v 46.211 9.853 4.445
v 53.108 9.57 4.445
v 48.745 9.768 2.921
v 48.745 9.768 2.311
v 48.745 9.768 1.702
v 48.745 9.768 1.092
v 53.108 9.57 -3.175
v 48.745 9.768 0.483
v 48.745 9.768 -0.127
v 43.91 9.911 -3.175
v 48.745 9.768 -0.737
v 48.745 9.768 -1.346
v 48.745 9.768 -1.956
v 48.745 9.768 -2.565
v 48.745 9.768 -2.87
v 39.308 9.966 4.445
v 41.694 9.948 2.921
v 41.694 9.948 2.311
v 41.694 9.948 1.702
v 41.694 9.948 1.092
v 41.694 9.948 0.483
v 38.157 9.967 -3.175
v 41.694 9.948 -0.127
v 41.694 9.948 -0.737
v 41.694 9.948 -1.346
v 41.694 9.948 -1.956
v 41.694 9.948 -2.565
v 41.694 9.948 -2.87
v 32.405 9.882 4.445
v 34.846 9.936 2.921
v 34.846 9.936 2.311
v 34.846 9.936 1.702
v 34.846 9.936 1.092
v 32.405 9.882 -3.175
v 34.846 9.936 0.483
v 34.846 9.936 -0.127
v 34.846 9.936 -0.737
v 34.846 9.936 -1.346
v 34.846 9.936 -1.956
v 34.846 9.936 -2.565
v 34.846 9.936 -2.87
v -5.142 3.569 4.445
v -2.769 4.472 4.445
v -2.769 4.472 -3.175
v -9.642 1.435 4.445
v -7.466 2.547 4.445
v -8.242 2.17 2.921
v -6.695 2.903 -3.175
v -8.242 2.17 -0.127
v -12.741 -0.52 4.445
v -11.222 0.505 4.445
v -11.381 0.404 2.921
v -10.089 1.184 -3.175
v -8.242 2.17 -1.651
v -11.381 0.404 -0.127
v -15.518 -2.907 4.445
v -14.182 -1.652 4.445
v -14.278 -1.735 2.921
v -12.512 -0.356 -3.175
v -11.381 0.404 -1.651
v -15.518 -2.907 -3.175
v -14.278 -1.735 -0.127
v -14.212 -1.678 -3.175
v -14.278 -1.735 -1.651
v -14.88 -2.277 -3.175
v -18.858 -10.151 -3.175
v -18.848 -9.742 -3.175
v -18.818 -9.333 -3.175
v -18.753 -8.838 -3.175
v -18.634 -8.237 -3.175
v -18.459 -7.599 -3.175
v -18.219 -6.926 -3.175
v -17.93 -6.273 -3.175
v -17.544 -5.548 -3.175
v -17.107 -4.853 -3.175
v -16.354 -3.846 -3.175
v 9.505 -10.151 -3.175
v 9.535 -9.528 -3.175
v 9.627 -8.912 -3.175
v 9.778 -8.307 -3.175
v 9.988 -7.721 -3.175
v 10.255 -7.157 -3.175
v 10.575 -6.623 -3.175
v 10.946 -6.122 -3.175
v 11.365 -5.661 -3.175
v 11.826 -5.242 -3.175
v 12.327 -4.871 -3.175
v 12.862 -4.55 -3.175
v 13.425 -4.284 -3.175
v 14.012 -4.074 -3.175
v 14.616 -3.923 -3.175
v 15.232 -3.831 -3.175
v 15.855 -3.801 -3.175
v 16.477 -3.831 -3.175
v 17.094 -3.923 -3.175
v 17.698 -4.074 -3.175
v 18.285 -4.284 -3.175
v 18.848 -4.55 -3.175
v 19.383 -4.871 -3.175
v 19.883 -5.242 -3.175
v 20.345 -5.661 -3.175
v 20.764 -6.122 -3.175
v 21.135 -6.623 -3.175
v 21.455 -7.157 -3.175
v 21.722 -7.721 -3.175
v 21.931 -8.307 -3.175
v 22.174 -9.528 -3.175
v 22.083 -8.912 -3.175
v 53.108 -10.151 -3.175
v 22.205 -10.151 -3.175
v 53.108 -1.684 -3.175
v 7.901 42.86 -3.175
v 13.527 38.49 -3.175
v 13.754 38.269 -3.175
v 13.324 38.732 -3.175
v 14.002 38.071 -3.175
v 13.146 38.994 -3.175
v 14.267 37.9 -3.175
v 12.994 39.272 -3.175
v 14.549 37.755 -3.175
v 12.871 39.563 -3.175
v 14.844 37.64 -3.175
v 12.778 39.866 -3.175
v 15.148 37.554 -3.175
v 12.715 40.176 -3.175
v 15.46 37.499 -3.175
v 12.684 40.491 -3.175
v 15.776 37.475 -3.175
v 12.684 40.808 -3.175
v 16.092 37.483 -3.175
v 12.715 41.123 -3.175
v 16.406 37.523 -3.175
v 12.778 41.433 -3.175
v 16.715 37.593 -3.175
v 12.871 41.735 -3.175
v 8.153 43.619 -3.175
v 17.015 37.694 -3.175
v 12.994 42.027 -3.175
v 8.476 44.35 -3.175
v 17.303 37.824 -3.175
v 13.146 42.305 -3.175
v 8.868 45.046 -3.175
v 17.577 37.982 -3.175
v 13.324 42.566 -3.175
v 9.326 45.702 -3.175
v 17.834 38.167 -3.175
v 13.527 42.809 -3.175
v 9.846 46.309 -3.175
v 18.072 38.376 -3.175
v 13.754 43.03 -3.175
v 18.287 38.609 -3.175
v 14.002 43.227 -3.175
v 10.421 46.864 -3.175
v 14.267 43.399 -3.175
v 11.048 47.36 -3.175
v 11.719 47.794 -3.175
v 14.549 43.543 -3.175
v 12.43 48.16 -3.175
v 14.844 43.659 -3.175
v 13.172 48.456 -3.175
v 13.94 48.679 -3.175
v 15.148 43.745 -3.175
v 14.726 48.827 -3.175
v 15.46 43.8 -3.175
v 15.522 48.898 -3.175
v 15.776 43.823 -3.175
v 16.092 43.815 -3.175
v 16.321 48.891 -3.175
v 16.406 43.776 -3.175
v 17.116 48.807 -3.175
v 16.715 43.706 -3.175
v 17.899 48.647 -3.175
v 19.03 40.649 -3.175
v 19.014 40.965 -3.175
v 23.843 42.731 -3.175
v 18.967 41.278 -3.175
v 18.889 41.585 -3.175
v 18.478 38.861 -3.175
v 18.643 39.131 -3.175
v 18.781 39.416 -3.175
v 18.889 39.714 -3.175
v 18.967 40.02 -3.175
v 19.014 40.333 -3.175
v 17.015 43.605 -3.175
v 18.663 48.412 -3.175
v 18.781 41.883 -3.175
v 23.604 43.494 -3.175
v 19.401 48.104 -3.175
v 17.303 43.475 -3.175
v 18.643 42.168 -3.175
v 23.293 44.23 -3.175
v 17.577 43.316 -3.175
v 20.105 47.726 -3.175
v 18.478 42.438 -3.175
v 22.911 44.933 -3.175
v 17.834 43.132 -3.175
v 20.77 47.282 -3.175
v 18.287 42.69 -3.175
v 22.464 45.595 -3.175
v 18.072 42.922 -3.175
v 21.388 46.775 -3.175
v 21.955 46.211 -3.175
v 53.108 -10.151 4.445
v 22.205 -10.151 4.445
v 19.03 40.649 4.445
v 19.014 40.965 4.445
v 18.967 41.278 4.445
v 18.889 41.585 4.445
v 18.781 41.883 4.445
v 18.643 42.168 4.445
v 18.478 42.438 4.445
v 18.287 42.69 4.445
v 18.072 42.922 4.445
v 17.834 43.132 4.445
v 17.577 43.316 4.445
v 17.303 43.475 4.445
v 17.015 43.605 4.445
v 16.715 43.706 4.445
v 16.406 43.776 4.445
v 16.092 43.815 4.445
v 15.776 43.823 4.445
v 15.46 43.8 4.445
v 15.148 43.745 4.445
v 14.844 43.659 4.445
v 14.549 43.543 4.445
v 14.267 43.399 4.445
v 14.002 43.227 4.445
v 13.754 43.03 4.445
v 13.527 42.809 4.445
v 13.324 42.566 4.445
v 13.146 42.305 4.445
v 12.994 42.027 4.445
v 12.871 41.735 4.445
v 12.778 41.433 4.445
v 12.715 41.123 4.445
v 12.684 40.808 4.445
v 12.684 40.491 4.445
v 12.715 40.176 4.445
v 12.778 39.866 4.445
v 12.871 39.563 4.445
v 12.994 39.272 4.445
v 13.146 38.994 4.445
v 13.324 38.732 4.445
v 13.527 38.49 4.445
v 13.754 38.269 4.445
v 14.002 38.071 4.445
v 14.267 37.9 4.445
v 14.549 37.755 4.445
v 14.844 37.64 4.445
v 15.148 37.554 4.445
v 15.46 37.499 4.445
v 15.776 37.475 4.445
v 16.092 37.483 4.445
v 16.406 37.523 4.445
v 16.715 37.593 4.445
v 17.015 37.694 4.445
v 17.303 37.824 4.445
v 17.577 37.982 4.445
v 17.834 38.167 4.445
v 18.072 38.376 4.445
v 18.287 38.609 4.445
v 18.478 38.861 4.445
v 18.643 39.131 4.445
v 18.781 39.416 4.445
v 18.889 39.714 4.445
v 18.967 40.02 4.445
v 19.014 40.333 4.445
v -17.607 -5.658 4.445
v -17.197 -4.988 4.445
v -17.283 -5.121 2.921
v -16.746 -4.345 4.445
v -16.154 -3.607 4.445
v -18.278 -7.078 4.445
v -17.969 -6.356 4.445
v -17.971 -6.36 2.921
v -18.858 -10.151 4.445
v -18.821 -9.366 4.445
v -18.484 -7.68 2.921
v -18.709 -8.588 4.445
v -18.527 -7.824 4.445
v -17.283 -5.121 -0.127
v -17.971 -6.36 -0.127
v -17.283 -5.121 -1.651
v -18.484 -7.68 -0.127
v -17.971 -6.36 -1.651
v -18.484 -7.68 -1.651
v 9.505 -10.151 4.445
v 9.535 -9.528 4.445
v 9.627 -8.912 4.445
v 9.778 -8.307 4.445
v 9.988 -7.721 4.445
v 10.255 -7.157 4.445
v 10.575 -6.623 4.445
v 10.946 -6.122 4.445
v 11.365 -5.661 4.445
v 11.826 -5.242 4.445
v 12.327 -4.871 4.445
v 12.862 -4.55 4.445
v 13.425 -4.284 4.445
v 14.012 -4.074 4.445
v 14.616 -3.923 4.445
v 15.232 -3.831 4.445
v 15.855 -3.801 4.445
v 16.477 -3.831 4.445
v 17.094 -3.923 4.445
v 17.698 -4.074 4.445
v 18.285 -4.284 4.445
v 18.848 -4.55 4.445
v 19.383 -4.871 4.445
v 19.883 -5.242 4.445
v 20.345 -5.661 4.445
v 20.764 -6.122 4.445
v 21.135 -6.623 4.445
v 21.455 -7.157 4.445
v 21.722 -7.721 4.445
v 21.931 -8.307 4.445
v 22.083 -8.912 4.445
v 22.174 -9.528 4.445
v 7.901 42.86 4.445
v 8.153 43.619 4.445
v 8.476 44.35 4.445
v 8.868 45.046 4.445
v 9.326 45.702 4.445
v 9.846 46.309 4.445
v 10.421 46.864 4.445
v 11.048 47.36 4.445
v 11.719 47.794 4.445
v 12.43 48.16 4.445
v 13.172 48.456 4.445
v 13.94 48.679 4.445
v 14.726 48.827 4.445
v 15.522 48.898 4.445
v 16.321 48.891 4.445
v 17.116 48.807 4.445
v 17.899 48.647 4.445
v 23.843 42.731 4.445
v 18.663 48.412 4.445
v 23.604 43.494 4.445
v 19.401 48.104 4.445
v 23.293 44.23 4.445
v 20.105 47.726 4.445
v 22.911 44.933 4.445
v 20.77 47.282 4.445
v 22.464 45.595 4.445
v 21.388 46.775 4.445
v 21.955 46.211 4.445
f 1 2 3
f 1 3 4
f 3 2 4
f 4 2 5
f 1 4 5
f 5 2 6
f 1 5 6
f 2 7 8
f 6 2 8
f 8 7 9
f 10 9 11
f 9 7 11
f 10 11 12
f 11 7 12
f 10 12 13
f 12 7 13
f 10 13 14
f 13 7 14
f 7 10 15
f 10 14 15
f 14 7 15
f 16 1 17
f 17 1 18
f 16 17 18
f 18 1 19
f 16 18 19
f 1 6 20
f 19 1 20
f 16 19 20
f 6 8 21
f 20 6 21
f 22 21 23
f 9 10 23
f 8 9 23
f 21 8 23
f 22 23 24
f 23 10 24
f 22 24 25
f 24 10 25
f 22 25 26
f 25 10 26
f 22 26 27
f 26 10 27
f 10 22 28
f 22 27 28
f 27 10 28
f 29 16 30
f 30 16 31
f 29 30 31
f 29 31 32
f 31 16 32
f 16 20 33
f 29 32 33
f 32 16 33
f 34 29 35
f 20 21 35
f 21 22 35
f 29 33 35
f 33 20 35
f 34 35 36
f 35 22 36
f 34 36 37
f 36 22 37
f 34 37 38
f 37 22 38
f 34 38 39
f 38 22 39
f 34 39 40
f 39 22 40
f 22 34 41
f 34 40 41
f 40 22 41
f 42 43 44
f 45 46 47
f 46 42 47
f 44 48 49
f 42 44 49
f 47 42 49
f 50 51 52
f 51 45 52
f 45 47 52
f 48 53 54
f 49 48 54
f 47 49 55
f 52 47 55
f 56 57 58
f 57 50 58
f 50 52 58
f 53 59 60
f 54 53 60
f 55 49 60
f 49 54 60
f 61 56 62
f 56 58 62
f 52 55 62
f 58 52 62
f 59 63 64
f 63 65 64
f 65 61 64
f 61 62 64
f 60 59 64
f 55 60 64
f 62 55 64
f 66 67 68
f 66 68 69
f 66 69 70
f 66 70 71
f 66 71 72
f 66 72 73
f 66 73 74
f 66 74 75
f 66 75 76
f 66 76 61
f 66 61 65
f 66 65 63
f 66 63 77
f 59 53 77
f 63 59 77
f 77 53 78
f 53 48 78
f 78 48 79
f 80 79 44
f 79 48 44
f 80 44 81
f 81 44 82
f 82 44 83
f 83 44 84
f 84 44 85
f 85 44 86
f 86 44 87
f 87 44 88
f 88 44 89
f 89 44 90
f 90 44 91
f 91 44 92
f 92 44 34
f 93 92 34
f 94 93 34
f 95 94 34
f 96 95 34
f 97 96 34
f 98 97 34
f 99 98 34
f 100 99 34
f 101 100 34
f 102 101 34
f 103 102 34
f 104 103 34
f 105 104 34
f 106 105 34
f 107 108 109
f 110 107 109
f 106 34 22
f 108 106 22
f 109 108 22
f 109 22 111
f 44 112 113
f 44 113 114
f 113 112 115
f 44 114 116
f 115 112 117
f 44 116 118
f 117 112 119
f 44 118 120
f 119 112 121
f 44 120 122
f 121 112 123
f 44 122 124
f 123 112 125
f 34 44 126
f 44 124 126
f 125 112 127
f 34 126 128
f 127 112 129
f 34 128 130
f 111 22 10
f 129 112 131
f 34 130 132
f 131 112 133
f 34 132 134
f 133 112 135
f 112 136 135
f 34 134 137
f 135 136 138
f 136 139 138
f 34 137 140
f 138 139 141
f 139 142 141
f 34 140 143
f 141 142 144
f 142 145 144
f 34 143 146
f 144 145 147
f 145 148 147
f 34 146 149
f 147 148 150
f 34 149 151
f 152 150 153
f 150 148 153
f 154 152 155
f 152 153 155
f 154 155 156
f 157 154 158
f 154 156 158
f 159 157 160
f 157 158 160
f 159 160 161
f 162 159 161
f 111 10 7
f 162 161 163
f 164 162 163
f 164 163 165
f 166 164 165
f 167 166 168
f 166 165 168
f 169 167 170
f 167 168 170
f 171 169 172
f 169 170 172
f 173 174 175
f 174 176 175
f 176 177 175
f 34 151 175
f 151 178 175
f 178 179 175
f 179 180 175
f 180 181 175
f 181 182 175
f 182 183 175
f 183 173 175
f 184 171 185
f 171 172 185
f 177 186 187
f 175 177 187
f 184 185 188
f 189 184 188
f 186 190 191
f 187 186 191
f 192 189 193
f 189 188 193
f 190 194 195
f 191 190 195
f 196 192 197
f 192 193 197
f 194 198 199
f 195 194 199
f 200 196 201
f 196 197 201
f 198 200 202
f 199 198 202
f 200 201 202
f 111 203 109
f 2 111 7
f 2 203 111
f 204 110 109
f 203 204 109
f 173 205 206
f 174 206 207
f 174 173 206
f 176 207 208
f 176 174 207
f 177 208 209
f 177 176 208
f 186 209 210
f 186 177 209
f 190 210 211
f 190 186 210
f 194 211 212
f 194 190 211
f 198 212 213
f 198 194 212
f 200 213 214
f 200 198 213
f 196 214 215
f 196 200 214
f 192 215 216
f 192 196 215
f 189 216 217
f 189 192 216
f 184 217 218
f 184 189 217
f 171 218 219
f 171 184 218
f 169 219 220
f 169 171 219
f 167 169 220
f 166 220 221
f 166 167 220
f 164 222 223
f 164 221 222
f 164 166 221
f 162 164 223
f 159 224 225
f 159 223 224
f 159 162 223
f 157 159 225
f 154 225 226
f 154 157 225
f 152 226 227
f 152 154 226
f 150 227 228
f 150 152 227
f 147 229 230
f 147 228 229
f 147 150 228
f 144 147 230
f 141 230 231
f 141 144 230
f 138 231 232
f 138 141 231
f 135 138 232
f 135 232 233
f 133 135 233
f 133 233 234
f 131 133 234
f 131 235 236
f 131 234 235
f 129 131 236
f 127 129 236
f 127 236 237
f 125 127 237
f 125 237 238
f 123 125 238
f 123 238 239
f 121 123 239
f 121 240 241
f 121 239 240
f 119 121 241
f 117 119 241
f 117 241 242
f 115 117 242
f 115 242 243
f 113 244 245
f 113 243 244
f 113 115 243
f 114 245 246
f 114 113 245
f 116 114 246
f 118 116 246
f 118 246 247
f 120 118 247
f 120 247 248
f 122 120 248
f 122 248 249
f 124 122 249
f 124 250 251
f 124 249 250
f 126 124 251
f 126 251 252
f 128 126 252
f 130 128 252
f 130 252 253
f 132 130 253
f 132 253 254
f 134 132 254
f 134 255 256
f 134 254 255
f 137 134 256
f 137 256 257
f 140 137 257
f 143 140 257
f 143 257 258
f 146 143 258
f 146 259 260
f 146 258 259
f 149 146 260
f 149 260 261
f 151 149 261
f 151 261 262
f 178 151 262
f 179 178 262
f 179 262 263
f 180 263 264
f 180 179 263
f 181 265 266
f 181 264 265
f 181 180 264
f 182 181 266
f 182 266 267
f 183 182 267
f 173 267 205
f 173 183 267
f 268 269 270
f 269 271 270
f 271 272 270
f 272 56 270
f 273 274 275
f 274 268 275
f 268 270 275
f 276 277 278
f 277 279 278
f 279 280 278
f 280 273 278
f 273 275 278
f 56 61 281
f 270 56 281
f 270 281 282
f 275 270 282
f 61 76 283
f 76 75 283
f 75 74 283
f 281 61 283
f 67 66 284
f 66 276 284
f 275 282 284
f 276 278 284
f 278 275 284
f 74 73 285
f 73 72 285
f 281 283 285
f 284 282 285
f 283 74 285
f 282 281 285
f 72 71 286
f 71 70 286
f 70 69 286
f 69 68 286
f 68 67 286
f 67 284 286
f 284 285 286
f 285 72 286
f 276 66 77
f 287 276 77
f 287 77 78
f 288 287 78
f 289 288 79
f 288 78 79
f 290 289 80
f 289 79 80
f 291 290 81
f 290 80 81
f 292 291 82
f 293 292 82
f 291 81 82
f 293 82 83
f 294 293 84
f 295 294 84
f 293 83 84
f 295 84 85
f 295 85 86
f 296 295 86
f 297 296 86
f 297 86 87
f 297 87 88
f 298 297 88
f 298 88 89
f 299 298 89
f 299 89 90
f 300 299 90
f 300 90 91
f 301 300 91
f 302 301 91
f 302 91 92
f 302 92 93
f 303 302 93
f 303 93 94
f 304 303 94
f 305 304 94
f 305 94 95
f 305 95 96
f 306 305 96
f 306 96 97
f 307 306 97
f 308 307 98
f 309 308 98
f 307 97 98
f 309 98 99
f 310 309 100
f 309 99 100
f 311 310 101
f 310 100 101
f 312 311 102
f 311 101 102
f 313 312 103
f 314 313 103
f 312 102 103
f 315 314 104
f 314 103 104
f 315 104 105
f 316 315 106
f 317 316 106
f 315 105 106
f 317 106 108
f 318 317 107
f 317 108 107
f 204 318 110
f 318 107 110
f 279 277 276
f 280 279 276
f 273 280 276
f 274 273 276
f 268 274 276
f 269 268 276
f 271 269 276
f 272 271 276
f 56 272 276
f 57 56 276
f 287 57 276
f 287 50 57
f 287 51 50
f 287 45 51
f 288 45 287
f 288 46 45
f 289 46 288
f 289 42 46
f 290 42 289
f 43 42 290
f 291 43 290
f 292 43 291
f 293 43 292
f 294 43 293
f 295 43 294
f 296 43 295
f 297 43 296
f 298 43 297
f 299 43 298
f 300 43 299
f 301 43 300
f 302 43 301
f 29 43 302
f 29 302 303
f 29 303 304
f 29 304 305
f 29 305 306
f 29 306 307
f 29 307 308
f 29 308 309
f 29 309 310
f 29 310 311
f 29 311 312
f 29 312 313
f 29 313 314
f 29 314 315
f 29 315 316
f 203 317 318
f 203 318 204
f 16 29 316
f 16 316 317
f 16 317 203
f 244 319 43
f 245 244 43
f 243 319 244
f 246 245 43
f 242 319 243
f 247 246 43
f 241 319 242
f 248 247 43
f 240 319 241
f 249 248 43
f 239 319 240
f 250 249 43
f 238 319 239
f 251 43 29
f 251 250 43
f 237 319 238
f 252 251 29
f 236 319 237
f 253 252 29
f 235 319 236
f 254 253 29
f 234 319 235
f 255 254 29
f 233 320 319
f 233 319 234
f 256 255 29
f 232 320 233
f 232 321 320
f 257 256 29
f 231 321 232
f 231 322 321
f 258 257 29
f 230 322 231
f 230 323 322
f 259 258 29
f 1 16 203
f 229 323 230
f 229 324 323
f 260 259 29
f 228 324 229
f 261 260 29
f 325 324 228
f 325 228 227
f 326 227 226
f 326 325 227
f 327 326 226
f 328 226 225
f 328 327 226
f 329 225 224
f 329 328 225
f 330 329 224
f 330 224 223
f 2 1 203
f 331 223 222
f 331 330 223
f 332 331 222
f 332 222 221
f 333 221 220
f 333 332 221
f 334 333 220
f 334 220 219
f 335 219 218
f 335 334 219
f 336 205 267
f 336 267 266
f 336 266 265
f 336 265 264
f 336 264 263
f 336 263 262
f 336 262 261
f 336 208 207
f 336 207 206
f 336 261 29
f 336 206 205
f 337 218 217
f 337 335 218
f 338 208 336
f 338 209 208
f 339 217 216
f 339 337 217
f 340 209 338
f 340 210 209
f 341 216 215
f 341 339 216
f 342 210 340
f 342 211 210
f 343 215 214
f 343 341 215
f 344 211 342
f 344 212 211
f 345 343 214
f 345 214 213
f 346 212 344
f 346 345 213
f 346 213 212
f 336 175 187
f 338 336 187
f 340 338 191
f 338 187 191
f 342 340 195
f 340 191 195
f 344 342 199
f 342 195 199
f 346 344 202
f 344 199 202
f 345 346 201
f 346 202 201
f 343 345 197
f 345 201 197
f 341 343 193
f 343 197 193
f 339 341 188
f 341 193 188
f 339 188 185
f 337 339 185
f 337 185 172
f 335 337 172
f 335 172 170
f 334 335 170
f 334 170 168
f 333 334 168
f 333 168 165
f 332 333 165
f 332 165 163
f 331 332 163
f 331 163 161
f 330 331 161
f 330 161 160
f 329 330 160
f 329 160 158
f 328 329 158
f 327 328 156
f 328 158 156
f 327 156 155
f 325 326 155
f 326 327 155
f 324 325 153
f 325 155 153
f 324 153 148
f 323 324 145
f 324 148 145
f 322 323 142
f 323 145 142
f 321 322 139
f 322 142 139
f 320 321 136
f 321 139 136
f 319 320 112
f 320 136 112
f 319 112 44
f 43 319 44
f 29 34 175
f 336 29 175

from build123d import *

# Parameters (mm, degrees)
SKETCH2_R           = 1.5875
BOSS_EXTRUDE1_DEPTH = 6.35
SKETCH3_W           = 86.520299057
SKETCH3_H           = 50.752816227
CUT_EXTRUDE1_DEPTH  = 22.86
SCALE1_SCALE        = 2
SKETCH4_W           = 272.729370393
SKETCH4_H           = 354.83187758
CUT_EXTRUDE2_DEPTH  = 5.08


with BuildPart() as part:
    # Sketch2 → Boss-Extrude1 (new body)
    # profile 1 of 3: a face of its own
    with BuildSketch(Plane.XY):
        with BuildLine():
            ThreePointArc((1.670610722, 3.717638474), (6.757246034, 4.420597856), (9.525541119, 0.095721787))
            Line((9.525541119, 0.095721787), (14.182207787, 0.095721787))
            ThreePointArc((14.182207787, 0.095721787), (17.357207787, 3.270721787), (20.532207787, 0.095721787))
            Line((20.532207787, 0.095721787), (35.983874452, 0.095721787))
            Line((35.983874452, 0.095721787), (35.983874452, 4.329055121))
            Line((35.983874452, 4.329055121), (40.217207786, 4.329055121))
            Line((40.217207786, 4.329055121), (40.217207786, 0.095721787))
            Line((40.217207786, 0.095721787), (61.383874452, 0.095721787))
            Line((61.383874452, 0.095721787), (61.383874452, 3.270721787))
            Line((61.383874452, 3.270721787), (65.617207786, 3.270721787))
            Line((65.617207786, 3.270721787), (65.617207786, 0.095721787))
            Line((65.617207786, 0.095721787), (103.86369276, 0.095721787))
            ThreePointArc((103.86369276, 0.095721787), (103.701399804, 0.51971831), (103.297478426, 0.726985228))
            add(Edge.make_bspline(
                [(103.297478426, 0.726985228), (103.278401428, 0.729063962), (102.555454876, 0.807955214), (101.062938142, 0.9797924), (98.757762781, 1.268659765), (96.264687204, 1.604159637), (93.594492647, 1.985539835), (90.758742018, 2.410830368), (87.769477293, 2.877005798), (84.639221741, 3.37990378), (81.380911453, 3.914330069), (78.007857734, 4.474123419), (74.533703974, 5.052218069), (70.972402786, 5.640770262), (67.338193058, 6.231252409), (63.64558795, 6.814592878), (59.909367026, 7.381298257), (56.144575667, 7.921621871), (52.366523305, 8.42568744), (48.590787146, 8.883665117), (44.833214748, 9.285912766), (41.109926451, 9.623146231), (37.437313832, 9.88657477), (33.832039387, 10.068065432), (30.311032911, 10.16029608), (27.586882733, 10.157568276), (26.039008587, 10.123270788), (25.632313035, 10.111855728)],
                knots=[0.036532984, 0.036532984, 0.036532984, 0.036532984, 0.036780684, 0.045920102, 0.055931764, 0.066772884, 0.07839713, 0.090754827, 0.103793165, 0.117456432, 0.131686226, 0.146421738, 0.161599998, 0.177156133, 0.193023668, 0.209134786, 0.225420633, 0.241811602, 0.258237647, 0.274628557, 0.290914287, 0.307025229, 0.322892517, 0.338448342, 0.353626207, 0.368361232, 0.373613721, 0.373613721, 0.373613721, 0.373613721], degree=3))
            add(Edge.make_bspline(
                [(25.632313035, 10.111855728), (24.937254507, 10.092346946), (23.184818676, 10.025451452), (20.426871455, 9.842671724), (17.41757594, 9.524763014), (14.581362978, 9.097201986), (11.937145196, 8.559838657), (9.777339551, 7.98685794), (8.50999095, 7.572117066), (8.045152998, 7.406999756)],
                knots=[0.373613721, 0.373613721, 0.373613721, 0.373613721, 0.382590428, 0.396252961, 0.409290412, 0.42164701, 0.433269881, 0.444109249, 0.450476502, 0.450476502, 0.450476502, 0.450476502], degree=3))
            add(Edge.make_bspline(
                [(8.045152998, 7.406999756), (7.779260681, 7.312550875), (6.851122091, 6.967807185), (5.357476635, 6.31774957), (3.688721993, 5.384292388), (2.487404704, 4.50418497), (1.86787348, 3.922488633), (1.670610722, 3.717638474)],
                knots=[0.450476502, 0.450476502, 0.450476502, 0.450476502, 0.45411864, 0.463255055, 0.471479114, 0.478755289, 0.482422896, 0.482422896, 0.482422896, 0.482422896], degree=3))
        make_face()
    # profile 2 of 3: a face of its own
    with BuildSketch(Plane.XY):
        with BuildLine():
            Line((0.000541119, 0.095721787), (9.525541119, 0.095721787))
            ThreePointArc((9.525541119, 0.095721787), (6.757246034, 4.420597856), (1.670610722, 3.717638474))
            add(Edge.make_bspline(
                [(1.670610722, 3.717638474), (1.529186884, 3.570774992), (1.119191891, 3.11301165), (0.577729932, 2.332445287), (0.184929806, 1.416285372), (0.02630969, 0.681353971), (0.000541119, 0.263637648), (0.000541119, 0.095721787)],
                knots=[0.482422896, 0.482422896, 0.482422896, 0.482422896, 0.485052318, 0.490344026, 0.494609833, 0.497833231, 0.5, 0.5, 0.5, 0.5], degree=3))
        make_face()
    # profile 3 of 3: a face of its own
    with BuildSketch(Plane.XY):
        with BuildLine():
            Line((13.380481545, 26.601119745), (8.045152998, 7.406999756))
            add(Edge.make_bspline(
                [(25.632313035, 10.111855728), (24.937254507, 10.092346946), (23.184818676, 10.025451452), (20.426871455, 9.842671724), (17.41757594, 9.524763014), (14.581362978, 9.097201986), (11.937145196, 8.559838657), (9.777339551, 7.98685794), (8.50999095, 7.572117066), (8.045152998, 7.406999756)],
                knots=[0.373613721, 0.373613721, 0.373613721, 0.373613721, 0.382590428, 0.396252961, 0.409290412, 0.42164701, 0.433269881, 0.444109249, 0.450476502, 0.450476502, 0.450476502, 0.450476502], degree=3))
            Line((25.632313035, 10.111855728), (21.351268338, 26.536748478))
            ThreePointArc((21.351268338, 26.536748478), (17.390539973, 29.623087196), (13.380481545, 26.601119745))
        make_face()
        with Locations((17.357207787, 25.495721787)):
            Circle(SKETCH2_R, mode=Mode.SUBTRACT)
    extrude(amount=BOSS_EXTRUDE1_DEPTH)

    # Sketch3 → Cut-Extrude1 (cut)
    with BuildSketch(Plane.XY.offset(6.35)):
        with Locations((79.244023981, 18.591780176)):
            Rectangle(SKETCH3_W, SKETCH3_H)
    extrude(amount=-CUT_EXTRUDE1_DEPTH, mode=Mode.SUBTRACT)


with BuildPart() as part_1:
    # Scale1: scaled about (18.859528884, 10.342075023, 3.175)
    add(part.part.scale(SCALE1_SCALE).moved(Location((-18.859528884, -10.342075023, -3.175))))

    # Sketch4 → Cut-Extrude2 (cut)
    with BuildSketch(Plane.XY.offset(9.525000538)):
        with Locations((12.859074943, 7.536544166)):
            Rectangle(SKETCH4_W, SKETCH4_H)
    extrude(amount=-CUT_EXTRUDE2_DEPTH, mode=Mode.SUBTRACT)


solid = part_1.part
